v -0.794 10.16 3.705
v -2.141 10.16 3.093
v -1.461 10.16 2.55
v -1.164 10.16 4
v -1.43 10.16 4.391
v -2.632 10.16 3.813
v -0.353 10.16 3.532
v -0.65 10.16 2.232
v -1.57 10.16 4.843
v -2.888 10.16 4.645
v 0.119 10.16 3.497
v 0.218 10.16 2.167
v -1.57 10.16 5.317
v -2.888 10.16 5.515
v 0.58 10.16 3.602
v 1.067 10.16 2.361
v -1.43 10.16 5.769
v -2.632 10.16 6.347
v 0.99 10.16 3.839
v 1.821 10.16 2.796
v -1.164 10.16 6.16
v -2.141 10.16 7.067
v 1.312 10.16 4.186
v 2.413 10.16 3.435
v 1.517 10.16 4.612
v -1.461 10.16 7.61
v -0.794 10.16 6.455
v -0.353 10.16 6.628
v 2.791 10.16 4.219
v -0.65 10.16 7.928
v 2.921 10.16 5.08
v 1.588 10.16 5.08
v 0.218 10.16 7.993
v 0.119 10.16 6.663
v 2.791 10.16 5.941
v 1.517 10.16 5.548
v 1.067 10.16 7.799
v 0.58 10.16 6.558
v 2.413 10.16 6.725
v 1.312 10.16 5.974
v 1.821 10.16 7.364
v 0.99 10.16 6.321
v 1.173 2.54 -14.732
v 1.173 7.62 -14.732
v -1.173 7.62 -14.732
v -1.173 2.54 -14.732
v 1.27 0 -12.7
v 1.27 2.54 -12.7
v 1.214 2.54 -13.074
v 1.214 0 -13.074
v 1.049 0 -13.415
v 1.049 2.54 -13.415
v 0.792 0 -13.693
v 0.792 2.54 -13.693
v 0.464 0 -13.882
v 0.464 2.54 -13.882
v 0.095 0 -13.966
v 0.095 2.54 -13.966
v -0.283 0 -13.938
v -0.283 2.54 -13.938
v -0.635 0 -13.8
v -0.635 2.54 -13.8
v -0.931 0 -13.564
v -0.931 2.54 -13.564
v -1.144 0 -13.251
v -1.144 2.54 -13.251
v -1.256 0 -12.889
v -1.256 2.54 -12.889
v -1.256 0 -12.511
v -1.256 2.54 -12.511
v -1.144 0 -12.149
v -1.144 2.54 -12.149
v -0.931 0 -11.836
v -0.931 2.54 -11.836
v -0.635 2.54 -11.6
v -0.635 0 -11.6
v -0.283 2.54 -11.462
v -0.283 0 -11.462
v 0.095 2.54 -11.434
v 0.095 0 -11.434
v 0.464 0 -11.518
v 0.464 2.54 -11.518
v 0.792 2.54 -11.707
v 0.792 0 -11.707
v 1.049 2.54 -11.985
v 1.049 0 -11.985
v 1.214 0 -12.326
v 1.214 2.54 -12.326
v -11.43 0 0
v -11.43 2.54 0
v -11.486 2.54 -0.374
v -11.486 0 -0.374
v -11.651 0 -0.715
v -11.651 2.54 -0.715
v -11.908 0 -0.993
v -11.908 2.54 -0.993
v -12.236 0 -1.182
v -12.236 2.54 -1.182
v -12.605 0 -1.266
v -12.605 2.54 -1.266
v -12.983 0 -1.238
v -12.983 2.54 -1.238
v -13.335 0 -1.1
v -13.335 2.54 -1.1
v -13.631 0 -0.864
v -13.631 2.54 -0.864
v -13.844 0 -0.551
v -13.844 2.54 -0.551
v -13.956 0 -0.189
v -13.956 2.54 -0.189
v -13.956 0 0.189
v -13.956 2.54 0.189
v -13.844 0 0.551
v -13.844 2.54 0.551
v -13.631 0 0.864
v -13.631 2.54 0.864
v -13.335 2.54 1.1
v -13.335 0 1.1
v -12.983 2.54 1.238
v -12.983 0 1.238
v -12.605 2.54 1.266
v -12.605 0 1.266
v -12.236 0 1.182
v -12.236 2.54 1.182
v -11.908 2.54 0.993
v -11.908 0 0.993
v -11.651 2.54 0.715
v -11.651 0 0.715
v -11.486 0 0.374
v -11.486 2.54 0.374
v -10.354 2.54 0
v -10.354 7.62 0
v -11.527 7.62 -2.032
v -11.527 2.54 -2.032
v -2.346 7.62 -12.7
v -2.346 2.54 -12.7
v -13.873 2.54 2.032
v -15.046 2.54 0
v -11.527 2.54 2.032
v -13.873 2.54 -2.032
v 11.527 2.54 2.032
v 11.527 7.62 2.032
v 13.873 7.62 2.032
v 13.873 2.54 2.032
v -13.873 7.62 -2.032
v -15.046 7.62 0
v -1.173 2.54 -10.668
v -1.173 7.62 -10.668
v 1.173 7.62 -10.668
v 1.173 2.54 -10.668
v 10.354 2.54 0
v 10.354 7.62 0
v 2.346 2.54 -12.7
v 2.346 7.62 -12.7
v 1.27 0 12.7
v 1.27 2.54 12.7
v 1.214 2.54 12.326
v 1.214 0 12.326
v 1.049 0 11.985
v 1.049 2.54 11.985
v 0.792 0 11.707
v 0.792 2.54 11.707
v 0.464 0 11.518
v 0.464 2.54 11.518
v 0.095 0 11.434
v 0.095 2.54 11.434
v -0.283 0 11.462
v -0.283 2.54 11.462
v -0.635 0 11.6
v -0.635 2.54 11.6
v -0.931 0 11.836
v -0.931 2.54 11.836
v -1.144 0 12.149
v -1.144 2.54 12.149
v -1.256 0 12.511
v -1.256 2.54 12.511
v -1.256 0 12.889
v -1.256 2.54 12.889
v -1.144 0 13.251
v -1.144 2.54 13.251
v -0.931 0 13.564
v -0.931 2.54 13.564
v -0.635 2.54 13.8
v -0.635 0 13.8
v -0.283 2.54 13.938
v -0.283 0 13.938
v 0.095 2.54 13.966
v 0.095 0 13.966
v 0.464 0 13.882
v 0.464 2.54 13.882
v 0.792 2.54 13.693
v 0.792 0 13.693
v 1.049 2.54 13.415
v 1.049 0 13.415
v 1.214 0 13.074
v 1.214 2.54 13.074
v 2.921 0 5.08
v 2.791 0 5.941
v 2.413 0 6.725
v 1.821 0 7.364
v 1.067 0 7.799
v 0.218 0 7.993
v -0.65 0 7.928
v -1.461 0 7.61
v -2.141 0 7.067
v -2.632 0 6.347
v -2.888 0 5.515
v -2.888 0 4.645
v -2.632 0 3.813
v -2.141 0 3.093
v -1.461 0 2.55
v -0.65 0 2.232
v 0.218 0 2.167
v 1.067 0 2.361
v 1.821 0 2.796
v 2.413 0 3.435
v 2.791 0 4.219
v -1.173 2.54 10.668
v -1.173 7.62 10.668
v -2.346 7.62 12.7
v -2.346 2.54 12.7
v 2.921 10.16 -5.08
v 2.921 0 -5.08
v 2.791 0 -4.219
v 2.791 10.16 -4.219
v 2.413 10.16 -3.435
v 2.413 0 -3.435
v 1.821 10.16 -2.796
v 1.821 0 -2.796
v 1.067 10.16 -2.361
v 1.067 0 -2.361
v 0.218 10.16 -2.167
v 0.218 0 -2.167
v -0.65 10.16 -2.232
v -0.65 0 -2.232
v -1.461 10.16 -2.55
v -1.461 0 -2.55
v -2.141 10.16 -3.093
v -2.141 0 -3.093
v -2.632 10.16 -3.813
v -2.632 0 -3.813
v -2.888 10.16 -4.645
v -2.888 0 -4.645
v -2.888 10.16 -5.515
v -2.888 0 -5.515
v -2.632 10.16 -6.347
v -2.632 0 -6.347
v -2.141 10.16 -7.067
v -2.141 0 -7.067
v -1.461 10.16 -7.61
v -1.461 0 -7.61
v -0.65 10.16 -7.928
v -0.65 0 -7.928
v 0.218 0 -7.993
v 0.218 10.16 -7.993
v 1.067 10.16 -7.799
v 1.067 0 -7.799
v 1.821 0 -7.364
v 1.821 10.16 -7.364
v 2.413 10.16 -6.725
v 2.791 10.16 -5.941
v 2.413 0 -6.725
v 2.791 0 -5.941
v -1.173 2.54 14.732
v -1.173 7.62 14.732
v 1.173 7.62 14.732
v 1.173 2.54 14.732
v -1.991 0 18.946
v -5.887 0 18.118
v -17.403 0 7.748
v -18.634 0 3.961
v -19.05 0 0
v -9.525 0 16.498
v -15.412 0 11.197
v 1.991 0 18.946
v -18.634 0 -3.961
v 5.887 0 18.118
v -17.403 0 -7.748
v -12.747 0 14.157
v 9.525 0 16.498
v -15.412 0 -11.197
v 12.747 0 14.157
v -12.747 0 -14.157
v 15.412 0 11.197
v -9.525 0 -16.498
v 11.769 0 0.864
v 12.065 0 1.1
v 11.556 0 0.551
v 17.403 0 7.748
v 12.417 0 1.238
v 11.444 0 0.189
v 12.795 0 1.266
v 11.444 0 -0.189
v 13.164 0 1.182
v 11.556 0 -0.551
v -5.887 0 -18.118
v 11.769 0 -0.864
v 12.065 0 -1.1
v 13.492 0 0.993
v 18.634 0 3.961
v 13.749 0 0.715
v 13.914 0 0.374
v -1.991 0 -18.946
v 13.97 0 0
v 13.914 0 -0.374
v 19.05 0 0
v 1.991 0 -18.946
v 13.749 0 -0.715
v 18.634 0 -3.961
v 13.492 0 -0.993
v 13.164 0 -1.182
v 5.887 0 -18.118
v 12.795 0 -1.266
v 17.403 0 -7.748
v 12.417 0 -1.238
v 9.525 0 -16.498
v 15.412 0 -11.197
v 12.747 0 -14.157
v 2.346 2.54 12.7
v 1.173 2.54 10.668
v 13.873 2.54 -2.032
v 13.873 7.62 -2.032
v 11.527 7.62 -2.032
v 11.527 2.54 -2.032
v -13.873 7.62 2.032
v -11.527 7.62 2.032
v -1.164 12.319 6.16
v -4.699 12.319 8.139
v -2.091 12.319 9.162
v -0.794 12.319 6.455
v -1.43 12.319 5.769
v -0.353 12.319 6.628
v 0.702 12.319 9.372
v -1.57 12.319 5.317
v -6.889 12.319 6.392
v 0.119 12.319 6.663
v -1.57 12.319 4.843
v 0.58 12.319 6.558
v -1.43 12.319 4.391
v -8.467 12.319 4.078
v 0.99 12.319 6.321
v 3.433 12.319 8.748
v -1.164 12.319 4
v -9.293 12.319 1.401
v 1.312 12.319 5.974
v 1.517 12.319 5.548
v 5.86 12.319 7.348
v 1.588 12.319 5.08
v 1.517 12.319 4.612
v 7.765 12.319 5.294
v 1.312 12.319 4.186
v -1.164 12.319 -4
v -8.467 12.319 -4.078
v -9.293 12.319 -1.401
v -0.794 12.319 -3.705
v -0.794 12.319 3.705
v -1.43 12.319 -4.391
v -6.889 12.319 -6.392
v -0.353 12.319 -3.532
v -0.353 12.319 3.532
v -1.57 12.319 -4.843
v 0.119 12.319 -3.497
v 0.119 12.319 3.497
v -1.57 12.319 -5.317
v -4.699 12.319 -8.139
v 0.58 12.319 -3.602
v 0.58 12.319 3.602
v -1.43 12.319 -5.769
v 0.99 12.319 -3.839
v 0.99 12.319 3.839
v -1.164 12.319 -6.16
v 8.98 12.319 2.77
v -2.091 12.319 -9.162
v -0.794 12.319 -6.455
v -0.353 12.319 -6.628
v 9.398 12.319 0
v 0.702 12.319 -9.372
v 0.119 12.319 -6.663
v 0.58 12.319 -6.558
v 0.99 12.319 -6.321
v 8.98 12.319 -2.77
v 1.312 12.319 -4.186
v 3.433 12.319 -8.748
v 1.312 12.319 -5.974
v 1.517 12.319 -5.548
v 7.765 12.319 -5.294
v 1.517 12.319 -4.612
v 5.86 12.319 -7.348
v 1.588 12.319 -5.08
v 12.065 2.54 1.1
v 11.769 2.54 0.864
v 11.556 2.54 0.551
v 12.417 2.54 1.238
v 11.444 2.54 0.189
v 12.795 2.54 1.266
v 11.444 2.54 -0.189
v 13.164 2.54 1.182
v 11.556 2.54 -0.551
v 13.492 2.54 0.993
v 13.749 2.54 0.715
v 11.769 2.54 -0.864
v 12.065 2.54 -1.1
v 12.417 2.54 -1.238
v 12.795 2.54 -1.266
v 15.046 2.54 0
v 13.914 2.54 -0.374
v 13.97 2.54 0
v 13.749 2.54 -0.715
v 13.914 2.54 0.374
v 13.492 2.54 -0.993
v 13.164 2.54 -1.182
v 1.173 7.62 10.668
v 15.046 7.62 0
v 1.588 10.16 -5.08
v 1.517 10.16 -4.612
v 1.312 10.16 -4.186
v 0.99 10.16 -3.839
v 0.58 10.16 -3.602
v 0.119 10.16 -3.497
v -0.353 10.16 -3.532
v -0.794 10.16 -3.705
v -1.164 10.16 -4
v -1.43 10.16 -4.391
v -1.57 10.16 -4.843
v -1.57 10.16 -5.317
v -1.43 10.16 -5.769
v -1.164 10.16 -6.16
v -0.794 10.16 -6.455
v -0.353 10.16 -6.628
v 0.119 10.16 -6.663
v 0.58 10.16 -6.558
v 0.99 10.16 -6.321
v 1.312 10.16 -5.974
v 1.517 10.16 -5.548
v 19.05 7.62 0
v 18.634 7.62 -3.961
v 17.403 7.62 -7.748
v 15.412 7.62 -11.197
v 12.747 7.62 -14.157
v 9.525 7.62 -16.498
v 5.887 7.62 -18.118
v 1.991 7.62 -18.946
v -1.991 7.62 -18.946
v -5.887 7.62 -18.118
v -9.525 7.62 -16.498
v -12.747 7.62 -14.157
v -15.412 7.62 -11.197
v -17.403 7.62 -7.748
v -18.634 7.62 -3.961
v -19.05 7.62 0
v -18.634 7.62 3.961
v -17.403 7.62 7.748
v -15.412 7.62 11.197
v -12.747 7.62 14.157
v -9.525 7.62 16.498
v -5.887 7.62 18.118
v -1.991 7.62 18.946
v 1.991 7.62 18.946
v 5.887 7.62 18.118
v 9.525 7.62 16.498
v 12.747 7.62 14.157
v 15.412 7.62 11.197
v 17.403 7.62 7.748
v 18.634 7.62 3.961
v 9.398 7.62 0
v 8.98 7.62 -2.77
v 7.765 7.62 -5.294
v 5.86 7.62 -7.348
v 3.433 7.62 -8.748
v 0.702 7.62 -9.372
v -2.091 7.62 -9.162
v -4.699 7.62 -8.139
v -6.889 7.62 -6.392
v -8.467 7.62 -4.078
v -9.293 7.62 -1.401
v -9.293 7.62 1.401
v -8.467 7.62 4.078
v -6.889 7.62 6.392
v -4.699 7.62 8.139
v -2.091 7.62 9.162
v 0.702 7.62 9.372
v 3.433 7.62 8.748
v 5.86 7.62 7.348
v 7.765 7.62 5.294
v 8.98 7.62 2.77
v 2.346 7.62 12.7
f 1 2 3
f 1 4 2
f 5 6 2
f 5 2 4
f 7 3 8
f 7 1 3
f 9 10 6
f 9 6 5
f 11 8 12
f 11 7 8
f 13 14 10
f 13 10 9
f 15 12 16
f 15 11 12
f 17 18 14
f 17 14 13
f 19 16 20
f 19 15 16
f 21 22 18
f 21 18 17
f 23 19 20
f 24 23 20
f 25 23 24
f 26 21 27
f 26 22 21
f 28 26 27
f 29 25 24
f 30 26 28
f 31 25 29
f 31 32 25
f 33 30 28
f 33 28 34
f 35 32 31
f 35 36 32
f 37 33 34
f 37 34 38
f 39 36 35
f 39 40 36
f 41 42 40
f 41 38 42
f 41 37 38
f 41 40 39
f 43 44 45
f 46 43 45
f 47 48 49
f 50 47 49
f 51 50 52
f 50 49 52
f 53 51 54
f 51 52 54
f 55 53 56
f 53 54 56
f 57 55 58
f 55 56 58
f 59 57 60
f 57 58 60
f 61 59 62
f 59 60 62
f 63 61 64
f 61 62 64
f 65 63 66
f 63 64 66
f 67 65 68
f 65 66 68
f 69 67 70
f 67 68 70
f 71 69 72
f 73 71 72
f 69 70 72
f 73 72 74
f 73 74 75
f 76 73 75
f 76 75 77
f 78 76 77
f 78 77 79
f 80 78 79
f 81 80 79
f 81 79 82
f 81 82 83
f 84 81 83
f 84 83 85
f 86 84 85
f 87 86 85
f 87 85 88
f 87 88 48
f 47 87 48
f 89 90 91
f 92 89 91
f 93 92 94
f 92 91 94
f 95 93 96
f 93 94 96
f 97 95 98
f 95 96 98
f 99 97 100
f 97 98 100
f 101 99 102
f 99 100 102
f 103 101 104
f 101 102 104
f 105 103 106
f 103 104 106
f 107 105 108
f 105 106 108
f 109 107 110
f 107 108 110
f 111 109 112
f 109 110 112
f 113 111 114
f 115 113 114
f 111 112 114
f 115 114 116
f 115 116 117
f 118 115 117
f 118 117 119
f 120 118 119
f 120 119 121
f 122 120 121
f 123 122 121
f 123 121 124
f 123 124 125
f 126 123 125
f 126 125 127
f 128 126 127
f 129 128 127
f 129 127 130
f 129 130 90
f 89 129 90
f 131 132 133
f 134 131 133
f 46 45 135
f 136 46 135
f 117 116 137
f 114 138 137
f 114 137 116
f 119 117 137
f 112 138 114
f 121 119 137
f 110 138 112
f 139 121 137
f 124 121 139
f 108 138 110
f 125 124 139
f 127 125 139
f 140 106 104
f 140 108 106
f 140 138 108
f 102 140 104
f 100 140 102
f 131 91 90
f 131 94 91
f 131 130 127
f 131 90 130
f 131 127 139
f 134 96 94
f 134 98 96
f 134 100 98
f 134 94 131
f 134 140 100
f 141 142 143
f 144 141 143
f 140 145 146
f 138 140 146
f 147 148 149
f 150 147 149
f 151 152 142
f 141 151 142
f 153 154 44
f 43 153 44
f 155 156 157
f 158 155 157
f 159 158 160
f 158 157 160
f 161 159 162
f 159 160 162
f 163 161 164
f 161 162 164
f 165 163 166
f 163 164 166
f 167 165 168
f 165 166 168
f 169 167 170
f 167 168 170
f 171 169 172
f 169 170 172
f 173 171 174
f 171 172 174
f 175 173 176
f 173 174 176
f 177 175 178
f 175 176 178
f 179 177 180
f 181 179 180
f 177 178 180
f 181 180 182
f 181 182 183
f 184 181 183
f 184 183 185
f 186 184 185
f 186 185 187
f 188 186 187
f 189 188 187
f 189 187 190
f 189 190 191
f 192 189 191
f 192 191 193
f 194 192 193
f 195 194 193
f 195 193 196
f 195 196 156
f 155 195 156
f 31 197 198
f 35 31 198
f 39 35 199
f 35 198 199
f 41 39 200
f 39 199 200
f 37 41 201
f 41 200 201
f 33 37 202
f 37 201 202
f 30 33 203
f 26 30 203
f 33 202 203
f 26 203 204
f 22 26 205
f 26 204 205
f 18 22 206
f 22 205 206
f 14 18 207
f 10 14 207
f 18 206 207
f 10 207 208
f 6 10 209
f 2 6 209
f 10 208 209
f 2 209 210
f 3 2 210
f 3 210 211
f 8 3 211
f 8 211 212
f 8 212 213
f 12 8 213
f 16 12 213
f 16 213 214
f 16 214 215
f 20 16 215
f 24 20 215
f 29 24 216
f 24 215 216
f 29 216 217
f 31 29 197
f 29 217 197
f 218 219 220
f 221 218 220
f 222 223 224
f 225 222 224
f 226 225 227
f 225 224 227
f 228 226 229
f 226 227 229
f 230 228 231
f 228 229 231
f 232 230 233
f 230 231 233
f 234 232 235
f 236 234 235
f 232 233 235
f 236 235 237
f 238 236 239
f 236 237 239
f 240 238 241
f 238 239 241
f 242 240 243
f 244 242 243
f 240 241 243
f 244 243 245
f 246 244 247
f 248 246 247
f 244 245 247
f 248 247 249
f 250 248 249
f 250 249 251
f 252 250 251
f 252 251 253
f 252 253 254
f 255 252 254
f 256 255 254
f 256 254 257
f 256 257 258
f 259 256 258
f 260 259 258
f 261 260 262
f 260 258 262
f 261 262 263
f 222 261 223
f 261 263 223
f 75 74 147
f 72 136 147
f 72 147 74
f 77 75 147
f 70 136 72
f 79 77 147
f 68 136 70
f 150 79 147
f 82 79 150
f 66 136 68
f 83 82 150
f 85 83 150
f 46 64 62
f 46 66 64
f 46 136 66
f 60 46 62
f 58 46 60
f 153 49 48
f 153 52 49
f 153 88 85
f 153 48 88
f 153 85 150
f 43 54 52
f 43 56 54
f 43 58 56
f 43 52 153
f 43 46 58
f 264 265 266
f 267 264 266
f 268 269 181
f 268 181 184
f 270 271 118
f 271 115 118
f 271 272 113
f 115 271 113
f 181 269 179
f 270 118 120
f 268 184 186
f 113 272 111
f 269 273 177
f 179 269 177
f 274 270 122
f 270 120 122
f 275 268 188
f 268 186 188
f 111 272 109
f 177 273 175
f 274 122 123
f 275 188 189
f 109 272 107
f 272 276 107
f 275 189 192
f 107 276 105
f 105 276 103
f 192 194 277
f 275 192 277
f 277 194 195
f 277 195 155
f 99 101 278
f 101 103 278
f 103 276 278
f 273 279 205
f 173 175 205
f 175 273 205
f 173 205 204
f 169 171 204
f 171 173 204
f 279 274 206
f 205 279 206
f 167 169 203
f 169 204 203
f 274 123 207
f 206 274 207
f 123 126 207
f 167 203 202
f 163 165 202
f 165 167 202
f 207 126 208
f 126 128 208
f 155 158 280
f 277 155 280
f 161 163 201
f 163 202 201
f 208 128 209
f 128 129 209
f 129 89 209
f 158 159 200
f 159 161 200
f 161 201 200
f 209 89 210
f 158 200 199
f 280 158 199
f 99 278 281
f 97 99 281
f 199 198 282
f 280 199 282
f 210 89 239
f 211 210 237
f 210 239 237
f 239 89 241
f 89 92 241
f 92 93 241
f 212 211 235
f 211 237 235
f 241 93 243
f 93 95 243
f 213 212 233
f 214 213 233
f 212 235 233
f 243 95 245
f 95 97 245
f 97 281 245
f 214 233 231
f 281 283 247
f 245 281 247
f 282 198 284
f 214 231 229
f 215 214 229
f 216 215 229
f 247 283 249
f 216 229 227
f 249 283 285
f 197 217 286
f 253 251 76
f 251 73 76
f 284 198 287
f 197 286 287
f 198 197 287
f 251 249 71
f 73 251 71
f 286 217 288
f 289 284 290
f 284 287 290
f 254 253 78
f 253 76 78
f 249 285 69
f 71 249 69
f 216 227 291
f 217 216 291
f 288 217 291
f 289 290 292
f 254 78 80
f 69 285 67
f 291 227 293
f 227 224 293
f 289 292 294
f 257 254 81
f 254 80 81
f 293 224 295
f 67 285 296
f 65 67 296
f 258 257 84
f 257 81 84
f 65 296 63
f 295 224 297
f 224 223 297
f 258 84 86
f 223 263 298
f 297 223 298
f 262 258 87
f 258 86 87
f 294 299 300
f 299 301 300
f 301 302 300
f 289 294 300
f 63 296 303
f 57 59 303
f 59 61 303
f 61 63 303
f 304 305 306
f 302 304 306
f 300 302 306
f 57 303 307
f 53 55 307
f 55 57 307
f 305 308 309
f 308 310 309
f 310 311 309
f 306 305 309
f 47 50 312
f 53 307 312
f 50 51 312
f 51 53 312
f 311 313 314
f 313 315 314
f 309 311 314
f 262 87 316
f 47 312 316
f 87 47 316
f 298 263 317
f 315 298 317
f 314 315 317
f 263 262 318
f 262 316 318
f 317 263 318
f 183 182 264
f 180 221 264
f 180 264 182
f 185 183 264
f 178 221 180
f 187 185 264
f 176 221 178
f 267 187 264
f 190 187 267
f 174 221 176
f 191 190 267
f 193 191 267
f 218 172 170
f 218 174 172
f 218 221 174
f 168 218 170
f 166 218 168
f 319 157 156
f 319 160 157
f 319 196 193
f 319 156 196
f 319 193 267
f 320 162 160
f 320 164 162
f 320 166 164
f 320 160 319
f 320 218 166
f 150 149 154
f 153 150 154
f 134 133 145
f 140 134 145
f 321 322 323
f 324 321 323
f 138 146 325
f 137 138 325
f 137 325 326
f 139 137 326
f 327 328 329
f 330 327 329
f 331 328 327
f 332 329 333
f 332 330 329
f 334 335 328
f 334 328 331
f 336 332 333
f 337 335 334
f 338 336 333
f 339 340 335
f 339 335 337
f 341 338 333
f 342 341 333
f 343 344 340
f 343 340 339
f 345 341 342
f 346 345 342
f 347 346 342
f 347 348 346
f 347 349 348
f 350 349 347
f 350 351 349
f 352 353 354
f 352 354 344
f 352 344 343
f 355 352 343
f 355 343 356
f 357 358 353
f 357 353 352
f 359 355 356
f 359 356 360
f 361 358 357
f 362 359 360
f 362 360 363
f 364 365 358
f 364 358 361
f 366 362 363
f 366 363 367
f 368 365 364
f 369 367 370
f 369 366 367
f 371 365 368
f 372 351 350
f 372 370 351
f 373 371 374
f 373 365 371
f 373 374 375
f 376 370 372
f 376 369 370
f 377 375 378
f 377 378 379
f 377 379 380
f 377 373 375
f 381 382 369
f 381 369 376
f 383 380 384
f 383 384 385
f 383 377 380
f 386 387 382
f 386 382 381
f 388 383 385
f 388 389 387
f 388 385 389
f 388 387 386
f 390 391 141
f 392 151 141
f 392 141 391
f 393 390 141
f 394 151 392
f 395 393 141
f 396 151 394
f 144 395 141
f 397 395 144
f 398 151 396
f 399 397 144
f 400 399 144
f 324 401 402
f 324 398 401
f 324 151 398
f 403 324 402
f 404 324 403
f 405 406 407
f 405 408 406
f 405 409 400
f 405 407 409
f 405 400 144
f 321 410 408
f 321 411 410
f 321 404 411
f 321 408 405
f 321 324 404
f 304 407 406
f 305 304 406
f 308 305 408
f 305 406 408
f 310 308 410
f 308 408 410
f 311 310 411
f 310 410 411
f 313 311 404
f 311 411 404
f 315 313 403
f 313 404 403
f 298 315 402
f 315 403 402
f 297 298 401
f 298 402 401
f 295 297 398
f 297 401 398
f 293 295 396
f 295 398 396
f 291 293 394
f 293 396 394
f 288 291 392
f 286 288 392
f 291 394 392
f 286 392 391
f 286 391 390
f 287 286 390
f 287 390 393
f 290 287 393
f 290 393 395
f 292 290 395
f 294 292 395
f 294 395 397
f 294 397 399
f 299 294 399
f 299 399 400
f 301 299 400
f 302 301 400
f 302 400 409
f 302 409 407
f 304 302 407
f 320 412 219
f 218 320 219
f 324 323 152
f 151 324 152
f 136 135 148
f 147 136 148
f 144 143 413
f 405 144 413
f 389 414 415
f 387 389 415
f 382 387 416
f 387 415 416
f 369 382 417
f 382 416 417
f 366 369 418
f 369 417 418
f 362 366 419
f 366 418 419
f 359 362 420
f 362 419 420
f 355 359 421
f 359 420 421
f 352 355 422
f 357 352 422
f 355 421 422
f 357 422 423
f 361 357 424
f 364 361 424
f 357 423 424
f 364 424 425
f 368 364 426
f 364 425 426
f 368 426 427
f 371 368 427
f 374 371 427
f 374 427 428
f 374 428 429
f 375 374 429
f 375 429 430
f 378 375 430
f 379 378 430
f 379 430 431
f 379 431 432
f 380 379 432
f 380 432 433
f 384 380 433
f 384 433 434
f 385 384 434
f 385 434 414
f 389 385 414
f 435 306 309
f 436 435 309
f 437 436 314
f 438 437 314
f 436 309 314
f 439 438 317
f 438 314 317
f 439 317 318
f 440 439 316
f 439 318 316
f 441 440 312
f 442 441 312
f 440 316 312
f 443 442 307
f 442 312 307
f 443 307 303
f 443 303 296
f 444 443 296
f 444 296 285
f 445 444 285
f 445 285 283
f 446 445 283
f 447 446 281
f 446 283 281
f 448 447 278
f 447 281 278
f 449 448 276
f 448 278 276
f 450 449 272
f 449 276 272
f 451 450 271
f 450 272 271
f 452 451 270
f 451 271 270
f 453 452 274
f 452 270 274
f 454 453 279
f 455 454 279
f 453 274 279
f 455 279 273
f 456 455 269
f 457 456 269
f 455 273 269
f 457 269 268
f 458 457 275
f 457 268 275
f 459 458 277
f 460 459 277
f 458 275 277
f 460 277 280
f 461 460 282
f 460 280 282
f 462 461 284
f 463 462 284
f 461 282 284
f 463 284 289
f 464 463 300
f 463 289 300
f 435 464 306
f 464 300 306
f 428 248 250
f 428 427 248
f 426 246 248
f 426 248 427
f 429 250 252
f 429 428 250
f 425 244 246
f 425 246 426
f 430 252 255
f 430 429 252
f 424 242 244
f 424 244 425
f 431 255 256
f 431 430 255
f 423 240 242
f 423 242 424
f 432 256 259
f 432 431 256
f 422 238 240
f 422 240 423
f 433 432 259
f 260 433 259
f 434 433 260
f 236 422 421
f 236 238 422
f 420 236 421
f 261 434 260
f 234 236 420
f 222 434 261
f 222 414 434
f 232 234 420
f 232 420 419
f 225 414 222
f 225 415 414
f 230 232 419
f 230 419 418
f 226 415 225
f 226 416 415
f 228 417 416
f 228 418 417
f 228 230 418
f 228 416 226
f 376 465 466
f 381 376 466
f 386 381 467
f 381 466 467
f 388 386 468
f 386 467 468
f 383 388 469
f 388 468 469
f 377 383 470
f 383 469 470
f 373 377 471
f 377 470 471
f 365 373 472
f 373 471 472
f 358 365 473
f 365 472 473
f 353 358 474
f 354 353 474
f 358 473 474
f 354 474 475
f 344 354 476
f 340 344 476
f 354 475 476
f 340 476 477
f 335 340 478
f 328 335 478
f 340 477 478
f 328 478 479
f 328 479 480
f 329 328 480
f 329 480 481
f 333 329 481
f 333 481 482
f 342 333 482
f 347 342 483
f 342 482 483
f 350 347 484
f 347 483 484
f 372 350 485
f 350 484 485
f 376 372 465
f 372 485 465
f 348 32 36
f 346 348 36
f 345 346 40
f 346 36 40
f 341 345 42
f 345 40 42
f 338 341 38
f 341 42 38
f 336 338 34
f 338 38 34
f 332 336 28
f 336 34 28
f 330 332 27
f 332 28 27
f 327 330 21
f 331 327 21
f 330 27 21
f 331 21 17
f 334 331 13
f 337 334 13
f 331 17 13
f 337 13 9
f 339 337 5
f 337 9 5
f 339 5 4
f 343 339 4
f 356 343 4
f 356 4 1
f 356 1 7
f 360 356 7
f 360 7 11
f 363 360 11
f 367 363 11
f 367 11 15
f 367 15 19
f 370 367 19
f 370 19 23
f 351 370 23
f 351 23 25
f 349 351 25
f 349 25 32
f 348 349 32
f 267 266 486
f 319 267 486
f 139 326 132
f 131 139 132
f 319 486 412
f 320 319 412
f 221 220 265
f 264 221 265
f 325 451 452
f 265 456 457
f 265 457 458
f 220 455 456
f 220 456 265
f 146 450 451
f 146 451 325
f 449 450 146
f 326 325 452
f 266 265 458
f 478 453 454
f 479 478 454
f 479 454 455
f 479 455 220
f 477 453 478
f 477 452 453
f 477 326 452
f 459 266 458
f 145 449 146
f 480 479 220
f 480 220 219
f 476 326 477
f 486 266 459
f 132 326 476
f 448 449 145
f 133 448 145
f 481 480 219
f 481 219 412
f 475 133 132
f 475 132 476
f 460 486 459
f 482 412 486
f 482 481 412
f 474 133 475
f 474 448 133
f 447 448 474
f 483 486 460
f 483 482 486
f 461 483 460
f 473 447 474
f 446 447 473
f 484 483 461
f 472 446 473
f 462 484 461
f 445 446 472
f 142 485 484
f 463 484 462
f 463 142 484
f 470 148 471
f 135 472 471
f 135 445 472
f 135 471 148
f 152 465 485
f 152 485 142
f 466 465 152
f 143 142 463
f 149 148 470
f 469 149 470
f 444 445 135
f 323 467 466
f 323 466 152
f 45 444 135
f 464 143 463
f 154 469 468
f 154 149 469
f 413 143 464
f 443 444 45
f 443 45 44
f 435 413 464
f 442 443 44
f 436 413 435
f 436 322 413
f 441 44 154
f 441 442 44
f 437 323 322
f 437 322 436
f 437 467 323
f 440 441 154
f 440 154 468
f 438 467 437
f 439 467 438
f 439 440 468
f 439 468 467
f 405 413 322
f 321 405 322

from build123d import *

# Parameters (mm, degrees)
SKETCH1_R           = 19.05
BOSS_EXTRUDE1_DEPTH = 7.62
SKETCH2_R           = 9.398
BOSS_EXTRUDE2_DEPTH = 4.699
SKETCH7_R           = 2.921
CUT_EXTRUDE5_DEPTH  = 10.16
SKETCH12_R          = 1.5875
CUT_EXTRUDE6_DEPTH  = 3.159
CUT_EXTRUDE7_DEPTH  = 5.08
SKETCH14_R          = 1.27
CUT_EXTRUDE8_DEPTH  = 8.62


with BuildPart() as part:
    # Sketch1 → Boss-Extrude1 (new body)
    with BuildSketch(Plane(origin=(0, 0, 0), x_dir=(1, 0, 0), z_dir=(0, 1, 0))):
        Circle(SKETCH1_R)
    extrude(amount=BOSS_EXTRUDE1_DEPTH)

    # Sketch2 → Boss-Extrude2 (add)
    with BuildSketch(Plane(origin=(0, 7.62, 0), x_dir=(1, 0, 0), z_dir=(0, 1, 0))):
        Circle(SKETCH2_R)
    extrude(amount=BOSS_EXTRUDE2_DEPTH)

    # Sketch7 → Cut-Extrude5 (cut)
    with BuildSketch(Plane.XZ):
        with Locations((0, 5.08)):
            Circle(SKETCH7_R)
        with Locations((0, -5.08)):
            Circle(SKETCH7_R)
    extrude(amount=-CUT_EXTRUDE5_DEPTH, mode=Mode.SUBTRACT)

    # Sketch12 → Cut-Extrude6 (cut, through all)
    with BuildSketch(Plane.XZ.offset(-10.16)):
        with Locations((0, 5.08)):
            Circle(SKETCH12_R)
        with Locations((0, -5.08)):
            Circle(SKETCH12_R)
    extrude(amount=-CUT_EXTRUDE6_DEPTH, mode=Mode.SUBTRACT)

    # Sketch13 → Cut-Extrude7 (cut)
    with BuildSketch(Plane(origin=(0, 7.62, 0), x_dir=(1, 0, 0), z_dir=(0, 1, 0))):
        Polygon((2.346351494, 12.7), (1.173175747, 14.732), (-1.173175747, 14.732), (-2.346351494, 12.7), (-1.173175747, 10.668), (1.173175747, 10.668), align=None)
        Polygon((2.346351494, -12.7), (1.173175747, -10.668), (-1.173175747, -10.668), (-2.346351494, -12.7), (-1.173175747, -14.732), (1.173175747, -14.732), align=None)
        Polygon((15.046351494, 0), (13.873175747, 2.032), (11.526824253, 2.032), (10.353648506, 0), (11.526824253, -2.032), (13.873175747, -2.032), align=None)
        Polygon((-10.353648506, 0), (-11.526824253, 2.032), (-13.873175747, 2.032), (-15.046351494, 0), (-13.873175747, -2.032), (-11.526824253, -2.032), align=None)
    extrude(amount=-CUT_EXTRUDE7_DEPTH, mode=Mode.SUBTRACT)

    # Sketch14 → Cut-Extrude8 (cut, through all)
    with BuildSketch(Plane(origin=(0, 7.62, 0), x_dir=(1, 0, 0), z_dir=(0, 1, 0))):
        with Locations((0, 12.7)):
            Circle(SKETCH14_R)
        with Locations((12.7, 0)):
            Circle(SKETCH14_R)
        with Locations((0, -12.7)):
            Circle(SKETCH14_R)
        with Locations((-12.7, 0)):
            Circle(SKETCH14_R)
    extrude(amount=-CUT_EXTRUDE8_DEPTH, mode=Mode.SUBTRACT)


solid = part.part
